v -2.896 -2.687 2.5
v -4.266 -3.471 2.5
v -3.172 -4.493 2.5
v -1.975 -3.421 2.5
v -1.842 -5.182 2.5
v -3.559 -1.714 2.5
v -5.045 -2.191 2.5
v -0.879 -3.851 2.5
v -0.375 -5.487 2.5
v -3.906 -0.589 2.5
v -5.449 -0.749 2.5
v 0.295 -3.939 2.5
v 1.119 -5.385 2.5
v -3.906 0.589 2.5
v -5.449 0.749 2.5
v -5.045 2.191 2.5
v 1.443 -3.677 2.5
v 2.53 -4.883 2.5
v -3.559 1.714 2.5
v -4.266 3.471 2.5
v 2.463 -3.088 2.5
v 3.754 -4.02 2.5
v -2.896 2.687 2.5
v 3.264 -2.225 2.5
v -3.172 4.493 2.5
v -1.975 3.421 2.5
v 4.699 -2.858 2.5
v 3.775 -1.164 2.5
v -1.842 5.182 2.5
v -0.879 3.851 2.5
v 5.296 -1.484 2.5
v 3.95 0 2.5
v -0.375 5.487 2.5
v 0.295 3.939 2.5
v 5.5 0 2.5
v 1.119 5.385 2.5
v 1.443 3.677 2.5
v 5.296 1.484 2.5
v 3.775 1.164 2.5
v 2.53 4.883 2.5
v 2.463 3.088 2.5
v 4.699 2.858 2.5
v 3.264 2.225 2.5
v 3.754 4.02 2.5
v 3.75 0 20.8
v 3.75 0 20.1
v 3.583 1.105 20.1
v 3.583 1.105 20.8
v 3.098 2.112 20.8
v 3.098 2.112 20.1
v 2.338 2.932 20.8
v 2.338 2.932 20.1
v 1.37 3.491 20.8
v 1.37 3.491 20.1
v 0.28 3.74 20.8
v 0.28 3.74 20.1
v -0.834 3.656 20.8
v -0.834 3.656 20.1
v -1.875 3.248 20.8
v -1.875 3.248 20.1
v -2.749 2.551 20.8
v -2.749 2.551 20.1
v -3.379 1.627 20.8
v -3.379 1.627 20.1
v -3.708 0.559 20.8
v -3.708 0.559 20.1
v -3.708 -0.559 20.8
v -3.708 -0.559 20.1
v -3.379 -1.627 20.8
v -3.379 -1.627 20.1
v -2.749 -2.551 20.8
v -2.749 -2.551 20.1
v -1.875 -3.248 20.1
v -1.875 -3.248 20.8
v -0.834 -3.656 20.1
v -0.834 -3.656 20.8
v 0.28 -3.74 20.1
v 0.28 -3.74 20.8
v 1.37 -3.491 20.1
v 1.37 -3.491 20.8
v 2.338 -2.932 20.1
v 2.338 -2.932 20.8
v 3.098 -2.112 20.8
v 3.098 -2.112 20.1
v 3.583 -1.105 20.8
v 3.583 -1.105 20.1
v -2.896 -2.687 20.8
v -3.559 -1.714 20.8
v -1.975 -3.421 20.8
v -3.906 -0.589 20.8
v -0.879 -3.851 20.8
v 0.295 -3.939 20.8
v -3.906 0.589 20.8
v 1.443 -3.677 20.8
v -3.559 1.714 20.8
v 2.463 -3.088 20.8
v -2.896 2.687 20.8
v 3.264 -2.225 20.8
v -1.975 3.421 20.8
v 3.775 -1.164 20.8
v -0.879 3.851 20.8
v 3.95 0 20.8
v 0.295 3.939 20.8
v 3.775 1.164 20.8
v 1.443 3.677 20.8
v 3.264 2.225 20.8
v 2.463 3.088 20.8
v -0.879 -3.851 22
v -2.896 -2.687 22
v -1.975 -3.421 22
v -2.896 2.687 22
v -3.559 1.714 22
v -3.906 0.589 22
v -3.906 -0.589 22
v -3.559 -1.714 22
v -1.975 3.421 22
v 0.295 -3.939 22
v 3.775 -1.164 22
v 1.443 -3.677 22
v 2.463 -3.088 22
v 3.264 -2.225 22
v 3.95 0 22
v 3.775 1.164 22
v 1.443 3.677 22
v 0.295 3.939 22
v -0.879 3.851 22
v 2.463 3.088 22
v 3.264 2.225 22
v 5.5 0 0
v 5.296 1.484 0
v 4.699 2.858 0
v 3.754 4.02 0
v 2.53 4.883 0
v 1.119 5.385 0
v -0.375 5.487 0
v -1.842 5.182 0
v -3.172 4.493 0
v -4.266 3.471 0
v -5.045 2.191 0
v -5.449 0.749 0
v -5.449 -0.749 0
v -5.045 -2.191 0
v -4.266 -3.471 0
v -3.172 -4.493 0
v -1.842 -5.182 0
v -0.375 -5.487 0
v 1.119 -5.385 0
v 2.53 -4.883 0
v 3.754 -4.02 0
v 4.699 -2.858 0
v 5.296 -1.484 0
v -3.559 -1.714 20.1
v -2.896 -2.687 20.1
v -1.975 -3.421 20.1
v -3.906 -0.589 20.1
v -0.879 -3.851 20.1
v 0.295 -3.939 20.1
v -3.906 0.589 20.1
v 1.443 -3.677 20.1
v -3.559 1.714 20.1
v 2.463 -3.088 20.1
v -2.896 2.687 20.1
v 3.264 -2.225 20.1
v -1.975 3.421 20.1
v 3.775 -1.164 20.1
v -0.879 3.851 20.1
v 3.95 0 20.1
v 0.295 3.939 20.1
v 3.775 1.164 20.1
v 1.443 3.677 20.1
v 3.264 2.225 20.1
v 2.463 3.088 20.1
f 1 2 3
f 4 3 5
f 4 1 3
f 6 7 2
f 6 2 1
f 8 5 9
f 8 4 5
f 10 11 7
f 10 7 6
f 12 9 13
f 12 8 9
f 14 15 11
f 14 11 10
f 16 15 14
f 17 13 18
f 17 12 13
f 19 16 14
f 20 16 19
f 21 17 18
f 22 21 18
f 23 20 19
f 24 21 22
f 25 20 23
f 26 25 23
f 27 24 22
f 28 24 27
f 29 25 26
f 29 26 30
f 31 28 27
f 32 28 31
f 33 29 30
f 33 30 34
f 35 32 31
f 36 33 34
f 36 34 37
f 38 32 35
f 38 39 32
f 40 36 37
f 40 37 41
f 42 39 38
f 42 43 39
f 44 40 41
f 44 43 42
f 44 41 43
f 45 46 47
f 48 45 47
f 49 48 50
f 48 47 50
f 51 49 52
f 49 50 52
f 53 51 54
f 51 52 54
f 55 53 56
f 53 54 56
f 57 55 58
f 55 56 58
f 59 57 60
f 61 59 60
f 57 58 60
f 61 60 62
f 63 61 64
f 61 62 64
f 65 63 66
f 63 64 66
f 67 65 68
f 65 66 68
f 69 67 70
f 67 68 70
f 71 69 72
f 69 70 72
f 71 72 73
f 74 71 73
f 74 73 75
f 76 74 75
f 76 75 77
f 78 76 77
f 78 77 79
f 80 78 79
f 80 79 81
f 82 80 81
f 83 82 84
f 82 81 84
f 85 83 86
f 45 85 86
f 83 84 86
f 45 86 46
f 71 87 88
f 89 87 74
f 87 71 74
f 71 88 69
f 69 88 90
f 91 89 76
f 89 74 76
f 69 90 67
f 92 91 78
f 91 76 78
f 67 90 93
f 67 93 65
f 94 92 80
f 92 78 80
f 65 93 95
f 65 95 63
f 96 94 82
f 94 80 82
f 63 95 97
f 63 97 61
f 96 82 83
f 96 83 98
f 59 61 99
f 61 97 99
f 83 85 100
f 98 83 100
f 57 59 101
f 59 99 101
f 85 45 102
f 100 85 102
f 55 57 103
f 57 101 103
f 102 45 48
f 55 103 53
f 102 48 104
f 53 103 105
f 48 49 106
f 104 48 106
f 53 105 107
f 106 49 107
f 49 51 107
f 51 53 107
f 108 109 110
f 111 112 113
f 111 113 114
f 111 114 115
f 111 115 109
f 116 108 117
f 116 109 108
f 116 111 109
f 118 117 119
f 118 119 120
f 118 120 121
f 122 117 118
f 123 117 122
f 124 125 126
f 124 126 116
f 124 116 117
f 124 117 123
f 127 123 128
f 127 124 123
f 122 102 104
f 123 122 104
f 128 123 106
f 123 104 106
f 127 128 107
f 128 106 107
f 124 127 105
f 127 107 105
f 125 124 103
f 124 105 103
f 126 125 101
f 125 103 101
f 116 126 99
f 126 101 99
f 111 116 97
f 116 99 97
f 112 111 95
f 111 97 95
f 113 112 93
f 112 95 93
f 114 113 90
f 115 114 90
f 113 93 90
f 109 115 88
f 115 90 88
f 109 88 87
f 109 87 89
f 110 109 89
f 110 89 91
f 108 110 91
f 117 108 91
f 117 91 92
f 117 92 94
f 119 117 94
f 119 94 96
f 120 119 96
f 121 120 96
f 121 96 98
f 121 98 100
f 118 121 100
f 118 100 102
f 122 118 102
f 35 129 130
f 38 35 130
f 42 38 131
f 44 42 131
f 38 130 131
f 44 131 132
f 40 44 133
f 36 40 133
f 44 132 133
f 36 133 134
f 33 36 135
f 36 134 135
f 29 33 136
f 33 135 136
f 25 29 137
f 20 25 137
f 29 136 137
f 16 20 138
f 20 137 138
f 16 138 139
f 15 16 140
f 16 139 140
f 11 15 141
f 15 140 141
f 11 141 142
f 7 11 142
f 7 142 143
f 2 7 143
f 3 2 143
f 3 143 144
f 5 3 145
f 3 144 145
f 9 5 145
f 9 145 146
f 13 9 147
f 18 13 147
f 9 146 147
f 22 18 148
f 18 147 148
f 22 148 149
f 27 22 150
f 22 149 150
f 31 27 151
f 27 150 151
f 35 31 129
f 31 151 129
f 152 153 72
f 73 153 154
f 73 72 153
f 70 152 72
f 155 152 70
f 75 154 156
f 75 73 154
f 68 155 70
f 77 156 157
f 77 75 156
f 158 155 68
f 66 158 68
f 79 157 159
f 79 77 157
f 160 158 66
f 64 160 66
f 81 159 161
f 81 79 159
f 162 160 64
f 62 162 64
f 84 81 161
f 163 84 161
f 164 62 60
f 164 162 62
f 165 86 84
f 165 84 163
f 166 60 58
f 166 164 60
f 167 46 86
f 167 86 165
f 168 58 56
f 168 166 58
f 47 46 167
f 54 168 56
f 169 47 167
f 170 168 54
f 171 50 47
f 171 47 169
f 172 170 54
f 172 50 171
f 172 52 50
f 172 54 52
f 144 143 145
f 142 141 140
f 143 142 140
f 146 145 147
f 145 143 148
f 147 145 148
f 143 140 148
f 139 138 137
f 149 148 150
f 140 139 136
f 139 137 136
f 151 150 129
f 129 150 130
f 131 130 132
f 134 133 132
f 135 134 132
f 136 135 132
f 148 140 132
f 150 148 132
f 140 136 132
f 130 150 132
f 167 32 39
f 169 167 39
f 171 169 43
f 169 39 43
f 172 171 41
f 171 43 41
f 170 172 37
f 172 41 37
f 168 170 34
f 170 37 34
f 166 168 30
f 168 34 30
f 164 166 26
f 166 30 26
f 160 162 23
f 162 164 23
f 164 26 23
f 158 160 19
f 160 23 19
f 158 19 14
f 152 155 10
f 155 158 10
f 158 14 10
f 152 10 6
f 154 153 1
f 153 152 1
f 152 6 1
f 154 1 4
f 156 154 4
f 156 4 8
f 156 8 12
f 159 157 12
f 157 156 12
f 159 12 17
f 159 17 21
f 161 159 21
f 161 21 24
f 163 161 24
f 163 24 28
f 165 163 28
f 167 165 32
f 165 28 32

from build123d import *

# Parameters (mm, degrees)
F0_R     = 3.95
F1_DEPTH = 22
F2_R     = 5.5
F3_DEPTH = 2.5
F4_R     = 7.435927
F4_R_2   = 3.75
F5_DEPTH = 0.7


with BuildPart() as f1:
    # F0 (on Top) → F1 (new body)
    with BuildSketch(Plane.XY):
        Circle(F0_R)
    extrude(amount=F1_DEPTH)

    # F2 (on Top) → F3 (join)
    with BuildSketch(Plane.XY):
        Circle(F2_R)
    extrude(amount=F3_DEPTH)


with BuildPart() as f5:
    # F4 (on Top) → F5 (new body)
    with BuildSketch(Plane.XY):
        Circle(F4_R)
        Circle(F4_R_2, mode=Mode.SUBTRACT)
    extrude(amount=F5_DEPTH)


with BuildPart() as f5_1:
    # F6: moved
    add(f5.part.moved(Location((0, 0, 20.1))))


with BuildPart() as f1_1:
    add(f1.part)

    # F7: cut F5
    add(f5_1.part, mode=Mode.SUBTRACT)


solid = f1_1.part
